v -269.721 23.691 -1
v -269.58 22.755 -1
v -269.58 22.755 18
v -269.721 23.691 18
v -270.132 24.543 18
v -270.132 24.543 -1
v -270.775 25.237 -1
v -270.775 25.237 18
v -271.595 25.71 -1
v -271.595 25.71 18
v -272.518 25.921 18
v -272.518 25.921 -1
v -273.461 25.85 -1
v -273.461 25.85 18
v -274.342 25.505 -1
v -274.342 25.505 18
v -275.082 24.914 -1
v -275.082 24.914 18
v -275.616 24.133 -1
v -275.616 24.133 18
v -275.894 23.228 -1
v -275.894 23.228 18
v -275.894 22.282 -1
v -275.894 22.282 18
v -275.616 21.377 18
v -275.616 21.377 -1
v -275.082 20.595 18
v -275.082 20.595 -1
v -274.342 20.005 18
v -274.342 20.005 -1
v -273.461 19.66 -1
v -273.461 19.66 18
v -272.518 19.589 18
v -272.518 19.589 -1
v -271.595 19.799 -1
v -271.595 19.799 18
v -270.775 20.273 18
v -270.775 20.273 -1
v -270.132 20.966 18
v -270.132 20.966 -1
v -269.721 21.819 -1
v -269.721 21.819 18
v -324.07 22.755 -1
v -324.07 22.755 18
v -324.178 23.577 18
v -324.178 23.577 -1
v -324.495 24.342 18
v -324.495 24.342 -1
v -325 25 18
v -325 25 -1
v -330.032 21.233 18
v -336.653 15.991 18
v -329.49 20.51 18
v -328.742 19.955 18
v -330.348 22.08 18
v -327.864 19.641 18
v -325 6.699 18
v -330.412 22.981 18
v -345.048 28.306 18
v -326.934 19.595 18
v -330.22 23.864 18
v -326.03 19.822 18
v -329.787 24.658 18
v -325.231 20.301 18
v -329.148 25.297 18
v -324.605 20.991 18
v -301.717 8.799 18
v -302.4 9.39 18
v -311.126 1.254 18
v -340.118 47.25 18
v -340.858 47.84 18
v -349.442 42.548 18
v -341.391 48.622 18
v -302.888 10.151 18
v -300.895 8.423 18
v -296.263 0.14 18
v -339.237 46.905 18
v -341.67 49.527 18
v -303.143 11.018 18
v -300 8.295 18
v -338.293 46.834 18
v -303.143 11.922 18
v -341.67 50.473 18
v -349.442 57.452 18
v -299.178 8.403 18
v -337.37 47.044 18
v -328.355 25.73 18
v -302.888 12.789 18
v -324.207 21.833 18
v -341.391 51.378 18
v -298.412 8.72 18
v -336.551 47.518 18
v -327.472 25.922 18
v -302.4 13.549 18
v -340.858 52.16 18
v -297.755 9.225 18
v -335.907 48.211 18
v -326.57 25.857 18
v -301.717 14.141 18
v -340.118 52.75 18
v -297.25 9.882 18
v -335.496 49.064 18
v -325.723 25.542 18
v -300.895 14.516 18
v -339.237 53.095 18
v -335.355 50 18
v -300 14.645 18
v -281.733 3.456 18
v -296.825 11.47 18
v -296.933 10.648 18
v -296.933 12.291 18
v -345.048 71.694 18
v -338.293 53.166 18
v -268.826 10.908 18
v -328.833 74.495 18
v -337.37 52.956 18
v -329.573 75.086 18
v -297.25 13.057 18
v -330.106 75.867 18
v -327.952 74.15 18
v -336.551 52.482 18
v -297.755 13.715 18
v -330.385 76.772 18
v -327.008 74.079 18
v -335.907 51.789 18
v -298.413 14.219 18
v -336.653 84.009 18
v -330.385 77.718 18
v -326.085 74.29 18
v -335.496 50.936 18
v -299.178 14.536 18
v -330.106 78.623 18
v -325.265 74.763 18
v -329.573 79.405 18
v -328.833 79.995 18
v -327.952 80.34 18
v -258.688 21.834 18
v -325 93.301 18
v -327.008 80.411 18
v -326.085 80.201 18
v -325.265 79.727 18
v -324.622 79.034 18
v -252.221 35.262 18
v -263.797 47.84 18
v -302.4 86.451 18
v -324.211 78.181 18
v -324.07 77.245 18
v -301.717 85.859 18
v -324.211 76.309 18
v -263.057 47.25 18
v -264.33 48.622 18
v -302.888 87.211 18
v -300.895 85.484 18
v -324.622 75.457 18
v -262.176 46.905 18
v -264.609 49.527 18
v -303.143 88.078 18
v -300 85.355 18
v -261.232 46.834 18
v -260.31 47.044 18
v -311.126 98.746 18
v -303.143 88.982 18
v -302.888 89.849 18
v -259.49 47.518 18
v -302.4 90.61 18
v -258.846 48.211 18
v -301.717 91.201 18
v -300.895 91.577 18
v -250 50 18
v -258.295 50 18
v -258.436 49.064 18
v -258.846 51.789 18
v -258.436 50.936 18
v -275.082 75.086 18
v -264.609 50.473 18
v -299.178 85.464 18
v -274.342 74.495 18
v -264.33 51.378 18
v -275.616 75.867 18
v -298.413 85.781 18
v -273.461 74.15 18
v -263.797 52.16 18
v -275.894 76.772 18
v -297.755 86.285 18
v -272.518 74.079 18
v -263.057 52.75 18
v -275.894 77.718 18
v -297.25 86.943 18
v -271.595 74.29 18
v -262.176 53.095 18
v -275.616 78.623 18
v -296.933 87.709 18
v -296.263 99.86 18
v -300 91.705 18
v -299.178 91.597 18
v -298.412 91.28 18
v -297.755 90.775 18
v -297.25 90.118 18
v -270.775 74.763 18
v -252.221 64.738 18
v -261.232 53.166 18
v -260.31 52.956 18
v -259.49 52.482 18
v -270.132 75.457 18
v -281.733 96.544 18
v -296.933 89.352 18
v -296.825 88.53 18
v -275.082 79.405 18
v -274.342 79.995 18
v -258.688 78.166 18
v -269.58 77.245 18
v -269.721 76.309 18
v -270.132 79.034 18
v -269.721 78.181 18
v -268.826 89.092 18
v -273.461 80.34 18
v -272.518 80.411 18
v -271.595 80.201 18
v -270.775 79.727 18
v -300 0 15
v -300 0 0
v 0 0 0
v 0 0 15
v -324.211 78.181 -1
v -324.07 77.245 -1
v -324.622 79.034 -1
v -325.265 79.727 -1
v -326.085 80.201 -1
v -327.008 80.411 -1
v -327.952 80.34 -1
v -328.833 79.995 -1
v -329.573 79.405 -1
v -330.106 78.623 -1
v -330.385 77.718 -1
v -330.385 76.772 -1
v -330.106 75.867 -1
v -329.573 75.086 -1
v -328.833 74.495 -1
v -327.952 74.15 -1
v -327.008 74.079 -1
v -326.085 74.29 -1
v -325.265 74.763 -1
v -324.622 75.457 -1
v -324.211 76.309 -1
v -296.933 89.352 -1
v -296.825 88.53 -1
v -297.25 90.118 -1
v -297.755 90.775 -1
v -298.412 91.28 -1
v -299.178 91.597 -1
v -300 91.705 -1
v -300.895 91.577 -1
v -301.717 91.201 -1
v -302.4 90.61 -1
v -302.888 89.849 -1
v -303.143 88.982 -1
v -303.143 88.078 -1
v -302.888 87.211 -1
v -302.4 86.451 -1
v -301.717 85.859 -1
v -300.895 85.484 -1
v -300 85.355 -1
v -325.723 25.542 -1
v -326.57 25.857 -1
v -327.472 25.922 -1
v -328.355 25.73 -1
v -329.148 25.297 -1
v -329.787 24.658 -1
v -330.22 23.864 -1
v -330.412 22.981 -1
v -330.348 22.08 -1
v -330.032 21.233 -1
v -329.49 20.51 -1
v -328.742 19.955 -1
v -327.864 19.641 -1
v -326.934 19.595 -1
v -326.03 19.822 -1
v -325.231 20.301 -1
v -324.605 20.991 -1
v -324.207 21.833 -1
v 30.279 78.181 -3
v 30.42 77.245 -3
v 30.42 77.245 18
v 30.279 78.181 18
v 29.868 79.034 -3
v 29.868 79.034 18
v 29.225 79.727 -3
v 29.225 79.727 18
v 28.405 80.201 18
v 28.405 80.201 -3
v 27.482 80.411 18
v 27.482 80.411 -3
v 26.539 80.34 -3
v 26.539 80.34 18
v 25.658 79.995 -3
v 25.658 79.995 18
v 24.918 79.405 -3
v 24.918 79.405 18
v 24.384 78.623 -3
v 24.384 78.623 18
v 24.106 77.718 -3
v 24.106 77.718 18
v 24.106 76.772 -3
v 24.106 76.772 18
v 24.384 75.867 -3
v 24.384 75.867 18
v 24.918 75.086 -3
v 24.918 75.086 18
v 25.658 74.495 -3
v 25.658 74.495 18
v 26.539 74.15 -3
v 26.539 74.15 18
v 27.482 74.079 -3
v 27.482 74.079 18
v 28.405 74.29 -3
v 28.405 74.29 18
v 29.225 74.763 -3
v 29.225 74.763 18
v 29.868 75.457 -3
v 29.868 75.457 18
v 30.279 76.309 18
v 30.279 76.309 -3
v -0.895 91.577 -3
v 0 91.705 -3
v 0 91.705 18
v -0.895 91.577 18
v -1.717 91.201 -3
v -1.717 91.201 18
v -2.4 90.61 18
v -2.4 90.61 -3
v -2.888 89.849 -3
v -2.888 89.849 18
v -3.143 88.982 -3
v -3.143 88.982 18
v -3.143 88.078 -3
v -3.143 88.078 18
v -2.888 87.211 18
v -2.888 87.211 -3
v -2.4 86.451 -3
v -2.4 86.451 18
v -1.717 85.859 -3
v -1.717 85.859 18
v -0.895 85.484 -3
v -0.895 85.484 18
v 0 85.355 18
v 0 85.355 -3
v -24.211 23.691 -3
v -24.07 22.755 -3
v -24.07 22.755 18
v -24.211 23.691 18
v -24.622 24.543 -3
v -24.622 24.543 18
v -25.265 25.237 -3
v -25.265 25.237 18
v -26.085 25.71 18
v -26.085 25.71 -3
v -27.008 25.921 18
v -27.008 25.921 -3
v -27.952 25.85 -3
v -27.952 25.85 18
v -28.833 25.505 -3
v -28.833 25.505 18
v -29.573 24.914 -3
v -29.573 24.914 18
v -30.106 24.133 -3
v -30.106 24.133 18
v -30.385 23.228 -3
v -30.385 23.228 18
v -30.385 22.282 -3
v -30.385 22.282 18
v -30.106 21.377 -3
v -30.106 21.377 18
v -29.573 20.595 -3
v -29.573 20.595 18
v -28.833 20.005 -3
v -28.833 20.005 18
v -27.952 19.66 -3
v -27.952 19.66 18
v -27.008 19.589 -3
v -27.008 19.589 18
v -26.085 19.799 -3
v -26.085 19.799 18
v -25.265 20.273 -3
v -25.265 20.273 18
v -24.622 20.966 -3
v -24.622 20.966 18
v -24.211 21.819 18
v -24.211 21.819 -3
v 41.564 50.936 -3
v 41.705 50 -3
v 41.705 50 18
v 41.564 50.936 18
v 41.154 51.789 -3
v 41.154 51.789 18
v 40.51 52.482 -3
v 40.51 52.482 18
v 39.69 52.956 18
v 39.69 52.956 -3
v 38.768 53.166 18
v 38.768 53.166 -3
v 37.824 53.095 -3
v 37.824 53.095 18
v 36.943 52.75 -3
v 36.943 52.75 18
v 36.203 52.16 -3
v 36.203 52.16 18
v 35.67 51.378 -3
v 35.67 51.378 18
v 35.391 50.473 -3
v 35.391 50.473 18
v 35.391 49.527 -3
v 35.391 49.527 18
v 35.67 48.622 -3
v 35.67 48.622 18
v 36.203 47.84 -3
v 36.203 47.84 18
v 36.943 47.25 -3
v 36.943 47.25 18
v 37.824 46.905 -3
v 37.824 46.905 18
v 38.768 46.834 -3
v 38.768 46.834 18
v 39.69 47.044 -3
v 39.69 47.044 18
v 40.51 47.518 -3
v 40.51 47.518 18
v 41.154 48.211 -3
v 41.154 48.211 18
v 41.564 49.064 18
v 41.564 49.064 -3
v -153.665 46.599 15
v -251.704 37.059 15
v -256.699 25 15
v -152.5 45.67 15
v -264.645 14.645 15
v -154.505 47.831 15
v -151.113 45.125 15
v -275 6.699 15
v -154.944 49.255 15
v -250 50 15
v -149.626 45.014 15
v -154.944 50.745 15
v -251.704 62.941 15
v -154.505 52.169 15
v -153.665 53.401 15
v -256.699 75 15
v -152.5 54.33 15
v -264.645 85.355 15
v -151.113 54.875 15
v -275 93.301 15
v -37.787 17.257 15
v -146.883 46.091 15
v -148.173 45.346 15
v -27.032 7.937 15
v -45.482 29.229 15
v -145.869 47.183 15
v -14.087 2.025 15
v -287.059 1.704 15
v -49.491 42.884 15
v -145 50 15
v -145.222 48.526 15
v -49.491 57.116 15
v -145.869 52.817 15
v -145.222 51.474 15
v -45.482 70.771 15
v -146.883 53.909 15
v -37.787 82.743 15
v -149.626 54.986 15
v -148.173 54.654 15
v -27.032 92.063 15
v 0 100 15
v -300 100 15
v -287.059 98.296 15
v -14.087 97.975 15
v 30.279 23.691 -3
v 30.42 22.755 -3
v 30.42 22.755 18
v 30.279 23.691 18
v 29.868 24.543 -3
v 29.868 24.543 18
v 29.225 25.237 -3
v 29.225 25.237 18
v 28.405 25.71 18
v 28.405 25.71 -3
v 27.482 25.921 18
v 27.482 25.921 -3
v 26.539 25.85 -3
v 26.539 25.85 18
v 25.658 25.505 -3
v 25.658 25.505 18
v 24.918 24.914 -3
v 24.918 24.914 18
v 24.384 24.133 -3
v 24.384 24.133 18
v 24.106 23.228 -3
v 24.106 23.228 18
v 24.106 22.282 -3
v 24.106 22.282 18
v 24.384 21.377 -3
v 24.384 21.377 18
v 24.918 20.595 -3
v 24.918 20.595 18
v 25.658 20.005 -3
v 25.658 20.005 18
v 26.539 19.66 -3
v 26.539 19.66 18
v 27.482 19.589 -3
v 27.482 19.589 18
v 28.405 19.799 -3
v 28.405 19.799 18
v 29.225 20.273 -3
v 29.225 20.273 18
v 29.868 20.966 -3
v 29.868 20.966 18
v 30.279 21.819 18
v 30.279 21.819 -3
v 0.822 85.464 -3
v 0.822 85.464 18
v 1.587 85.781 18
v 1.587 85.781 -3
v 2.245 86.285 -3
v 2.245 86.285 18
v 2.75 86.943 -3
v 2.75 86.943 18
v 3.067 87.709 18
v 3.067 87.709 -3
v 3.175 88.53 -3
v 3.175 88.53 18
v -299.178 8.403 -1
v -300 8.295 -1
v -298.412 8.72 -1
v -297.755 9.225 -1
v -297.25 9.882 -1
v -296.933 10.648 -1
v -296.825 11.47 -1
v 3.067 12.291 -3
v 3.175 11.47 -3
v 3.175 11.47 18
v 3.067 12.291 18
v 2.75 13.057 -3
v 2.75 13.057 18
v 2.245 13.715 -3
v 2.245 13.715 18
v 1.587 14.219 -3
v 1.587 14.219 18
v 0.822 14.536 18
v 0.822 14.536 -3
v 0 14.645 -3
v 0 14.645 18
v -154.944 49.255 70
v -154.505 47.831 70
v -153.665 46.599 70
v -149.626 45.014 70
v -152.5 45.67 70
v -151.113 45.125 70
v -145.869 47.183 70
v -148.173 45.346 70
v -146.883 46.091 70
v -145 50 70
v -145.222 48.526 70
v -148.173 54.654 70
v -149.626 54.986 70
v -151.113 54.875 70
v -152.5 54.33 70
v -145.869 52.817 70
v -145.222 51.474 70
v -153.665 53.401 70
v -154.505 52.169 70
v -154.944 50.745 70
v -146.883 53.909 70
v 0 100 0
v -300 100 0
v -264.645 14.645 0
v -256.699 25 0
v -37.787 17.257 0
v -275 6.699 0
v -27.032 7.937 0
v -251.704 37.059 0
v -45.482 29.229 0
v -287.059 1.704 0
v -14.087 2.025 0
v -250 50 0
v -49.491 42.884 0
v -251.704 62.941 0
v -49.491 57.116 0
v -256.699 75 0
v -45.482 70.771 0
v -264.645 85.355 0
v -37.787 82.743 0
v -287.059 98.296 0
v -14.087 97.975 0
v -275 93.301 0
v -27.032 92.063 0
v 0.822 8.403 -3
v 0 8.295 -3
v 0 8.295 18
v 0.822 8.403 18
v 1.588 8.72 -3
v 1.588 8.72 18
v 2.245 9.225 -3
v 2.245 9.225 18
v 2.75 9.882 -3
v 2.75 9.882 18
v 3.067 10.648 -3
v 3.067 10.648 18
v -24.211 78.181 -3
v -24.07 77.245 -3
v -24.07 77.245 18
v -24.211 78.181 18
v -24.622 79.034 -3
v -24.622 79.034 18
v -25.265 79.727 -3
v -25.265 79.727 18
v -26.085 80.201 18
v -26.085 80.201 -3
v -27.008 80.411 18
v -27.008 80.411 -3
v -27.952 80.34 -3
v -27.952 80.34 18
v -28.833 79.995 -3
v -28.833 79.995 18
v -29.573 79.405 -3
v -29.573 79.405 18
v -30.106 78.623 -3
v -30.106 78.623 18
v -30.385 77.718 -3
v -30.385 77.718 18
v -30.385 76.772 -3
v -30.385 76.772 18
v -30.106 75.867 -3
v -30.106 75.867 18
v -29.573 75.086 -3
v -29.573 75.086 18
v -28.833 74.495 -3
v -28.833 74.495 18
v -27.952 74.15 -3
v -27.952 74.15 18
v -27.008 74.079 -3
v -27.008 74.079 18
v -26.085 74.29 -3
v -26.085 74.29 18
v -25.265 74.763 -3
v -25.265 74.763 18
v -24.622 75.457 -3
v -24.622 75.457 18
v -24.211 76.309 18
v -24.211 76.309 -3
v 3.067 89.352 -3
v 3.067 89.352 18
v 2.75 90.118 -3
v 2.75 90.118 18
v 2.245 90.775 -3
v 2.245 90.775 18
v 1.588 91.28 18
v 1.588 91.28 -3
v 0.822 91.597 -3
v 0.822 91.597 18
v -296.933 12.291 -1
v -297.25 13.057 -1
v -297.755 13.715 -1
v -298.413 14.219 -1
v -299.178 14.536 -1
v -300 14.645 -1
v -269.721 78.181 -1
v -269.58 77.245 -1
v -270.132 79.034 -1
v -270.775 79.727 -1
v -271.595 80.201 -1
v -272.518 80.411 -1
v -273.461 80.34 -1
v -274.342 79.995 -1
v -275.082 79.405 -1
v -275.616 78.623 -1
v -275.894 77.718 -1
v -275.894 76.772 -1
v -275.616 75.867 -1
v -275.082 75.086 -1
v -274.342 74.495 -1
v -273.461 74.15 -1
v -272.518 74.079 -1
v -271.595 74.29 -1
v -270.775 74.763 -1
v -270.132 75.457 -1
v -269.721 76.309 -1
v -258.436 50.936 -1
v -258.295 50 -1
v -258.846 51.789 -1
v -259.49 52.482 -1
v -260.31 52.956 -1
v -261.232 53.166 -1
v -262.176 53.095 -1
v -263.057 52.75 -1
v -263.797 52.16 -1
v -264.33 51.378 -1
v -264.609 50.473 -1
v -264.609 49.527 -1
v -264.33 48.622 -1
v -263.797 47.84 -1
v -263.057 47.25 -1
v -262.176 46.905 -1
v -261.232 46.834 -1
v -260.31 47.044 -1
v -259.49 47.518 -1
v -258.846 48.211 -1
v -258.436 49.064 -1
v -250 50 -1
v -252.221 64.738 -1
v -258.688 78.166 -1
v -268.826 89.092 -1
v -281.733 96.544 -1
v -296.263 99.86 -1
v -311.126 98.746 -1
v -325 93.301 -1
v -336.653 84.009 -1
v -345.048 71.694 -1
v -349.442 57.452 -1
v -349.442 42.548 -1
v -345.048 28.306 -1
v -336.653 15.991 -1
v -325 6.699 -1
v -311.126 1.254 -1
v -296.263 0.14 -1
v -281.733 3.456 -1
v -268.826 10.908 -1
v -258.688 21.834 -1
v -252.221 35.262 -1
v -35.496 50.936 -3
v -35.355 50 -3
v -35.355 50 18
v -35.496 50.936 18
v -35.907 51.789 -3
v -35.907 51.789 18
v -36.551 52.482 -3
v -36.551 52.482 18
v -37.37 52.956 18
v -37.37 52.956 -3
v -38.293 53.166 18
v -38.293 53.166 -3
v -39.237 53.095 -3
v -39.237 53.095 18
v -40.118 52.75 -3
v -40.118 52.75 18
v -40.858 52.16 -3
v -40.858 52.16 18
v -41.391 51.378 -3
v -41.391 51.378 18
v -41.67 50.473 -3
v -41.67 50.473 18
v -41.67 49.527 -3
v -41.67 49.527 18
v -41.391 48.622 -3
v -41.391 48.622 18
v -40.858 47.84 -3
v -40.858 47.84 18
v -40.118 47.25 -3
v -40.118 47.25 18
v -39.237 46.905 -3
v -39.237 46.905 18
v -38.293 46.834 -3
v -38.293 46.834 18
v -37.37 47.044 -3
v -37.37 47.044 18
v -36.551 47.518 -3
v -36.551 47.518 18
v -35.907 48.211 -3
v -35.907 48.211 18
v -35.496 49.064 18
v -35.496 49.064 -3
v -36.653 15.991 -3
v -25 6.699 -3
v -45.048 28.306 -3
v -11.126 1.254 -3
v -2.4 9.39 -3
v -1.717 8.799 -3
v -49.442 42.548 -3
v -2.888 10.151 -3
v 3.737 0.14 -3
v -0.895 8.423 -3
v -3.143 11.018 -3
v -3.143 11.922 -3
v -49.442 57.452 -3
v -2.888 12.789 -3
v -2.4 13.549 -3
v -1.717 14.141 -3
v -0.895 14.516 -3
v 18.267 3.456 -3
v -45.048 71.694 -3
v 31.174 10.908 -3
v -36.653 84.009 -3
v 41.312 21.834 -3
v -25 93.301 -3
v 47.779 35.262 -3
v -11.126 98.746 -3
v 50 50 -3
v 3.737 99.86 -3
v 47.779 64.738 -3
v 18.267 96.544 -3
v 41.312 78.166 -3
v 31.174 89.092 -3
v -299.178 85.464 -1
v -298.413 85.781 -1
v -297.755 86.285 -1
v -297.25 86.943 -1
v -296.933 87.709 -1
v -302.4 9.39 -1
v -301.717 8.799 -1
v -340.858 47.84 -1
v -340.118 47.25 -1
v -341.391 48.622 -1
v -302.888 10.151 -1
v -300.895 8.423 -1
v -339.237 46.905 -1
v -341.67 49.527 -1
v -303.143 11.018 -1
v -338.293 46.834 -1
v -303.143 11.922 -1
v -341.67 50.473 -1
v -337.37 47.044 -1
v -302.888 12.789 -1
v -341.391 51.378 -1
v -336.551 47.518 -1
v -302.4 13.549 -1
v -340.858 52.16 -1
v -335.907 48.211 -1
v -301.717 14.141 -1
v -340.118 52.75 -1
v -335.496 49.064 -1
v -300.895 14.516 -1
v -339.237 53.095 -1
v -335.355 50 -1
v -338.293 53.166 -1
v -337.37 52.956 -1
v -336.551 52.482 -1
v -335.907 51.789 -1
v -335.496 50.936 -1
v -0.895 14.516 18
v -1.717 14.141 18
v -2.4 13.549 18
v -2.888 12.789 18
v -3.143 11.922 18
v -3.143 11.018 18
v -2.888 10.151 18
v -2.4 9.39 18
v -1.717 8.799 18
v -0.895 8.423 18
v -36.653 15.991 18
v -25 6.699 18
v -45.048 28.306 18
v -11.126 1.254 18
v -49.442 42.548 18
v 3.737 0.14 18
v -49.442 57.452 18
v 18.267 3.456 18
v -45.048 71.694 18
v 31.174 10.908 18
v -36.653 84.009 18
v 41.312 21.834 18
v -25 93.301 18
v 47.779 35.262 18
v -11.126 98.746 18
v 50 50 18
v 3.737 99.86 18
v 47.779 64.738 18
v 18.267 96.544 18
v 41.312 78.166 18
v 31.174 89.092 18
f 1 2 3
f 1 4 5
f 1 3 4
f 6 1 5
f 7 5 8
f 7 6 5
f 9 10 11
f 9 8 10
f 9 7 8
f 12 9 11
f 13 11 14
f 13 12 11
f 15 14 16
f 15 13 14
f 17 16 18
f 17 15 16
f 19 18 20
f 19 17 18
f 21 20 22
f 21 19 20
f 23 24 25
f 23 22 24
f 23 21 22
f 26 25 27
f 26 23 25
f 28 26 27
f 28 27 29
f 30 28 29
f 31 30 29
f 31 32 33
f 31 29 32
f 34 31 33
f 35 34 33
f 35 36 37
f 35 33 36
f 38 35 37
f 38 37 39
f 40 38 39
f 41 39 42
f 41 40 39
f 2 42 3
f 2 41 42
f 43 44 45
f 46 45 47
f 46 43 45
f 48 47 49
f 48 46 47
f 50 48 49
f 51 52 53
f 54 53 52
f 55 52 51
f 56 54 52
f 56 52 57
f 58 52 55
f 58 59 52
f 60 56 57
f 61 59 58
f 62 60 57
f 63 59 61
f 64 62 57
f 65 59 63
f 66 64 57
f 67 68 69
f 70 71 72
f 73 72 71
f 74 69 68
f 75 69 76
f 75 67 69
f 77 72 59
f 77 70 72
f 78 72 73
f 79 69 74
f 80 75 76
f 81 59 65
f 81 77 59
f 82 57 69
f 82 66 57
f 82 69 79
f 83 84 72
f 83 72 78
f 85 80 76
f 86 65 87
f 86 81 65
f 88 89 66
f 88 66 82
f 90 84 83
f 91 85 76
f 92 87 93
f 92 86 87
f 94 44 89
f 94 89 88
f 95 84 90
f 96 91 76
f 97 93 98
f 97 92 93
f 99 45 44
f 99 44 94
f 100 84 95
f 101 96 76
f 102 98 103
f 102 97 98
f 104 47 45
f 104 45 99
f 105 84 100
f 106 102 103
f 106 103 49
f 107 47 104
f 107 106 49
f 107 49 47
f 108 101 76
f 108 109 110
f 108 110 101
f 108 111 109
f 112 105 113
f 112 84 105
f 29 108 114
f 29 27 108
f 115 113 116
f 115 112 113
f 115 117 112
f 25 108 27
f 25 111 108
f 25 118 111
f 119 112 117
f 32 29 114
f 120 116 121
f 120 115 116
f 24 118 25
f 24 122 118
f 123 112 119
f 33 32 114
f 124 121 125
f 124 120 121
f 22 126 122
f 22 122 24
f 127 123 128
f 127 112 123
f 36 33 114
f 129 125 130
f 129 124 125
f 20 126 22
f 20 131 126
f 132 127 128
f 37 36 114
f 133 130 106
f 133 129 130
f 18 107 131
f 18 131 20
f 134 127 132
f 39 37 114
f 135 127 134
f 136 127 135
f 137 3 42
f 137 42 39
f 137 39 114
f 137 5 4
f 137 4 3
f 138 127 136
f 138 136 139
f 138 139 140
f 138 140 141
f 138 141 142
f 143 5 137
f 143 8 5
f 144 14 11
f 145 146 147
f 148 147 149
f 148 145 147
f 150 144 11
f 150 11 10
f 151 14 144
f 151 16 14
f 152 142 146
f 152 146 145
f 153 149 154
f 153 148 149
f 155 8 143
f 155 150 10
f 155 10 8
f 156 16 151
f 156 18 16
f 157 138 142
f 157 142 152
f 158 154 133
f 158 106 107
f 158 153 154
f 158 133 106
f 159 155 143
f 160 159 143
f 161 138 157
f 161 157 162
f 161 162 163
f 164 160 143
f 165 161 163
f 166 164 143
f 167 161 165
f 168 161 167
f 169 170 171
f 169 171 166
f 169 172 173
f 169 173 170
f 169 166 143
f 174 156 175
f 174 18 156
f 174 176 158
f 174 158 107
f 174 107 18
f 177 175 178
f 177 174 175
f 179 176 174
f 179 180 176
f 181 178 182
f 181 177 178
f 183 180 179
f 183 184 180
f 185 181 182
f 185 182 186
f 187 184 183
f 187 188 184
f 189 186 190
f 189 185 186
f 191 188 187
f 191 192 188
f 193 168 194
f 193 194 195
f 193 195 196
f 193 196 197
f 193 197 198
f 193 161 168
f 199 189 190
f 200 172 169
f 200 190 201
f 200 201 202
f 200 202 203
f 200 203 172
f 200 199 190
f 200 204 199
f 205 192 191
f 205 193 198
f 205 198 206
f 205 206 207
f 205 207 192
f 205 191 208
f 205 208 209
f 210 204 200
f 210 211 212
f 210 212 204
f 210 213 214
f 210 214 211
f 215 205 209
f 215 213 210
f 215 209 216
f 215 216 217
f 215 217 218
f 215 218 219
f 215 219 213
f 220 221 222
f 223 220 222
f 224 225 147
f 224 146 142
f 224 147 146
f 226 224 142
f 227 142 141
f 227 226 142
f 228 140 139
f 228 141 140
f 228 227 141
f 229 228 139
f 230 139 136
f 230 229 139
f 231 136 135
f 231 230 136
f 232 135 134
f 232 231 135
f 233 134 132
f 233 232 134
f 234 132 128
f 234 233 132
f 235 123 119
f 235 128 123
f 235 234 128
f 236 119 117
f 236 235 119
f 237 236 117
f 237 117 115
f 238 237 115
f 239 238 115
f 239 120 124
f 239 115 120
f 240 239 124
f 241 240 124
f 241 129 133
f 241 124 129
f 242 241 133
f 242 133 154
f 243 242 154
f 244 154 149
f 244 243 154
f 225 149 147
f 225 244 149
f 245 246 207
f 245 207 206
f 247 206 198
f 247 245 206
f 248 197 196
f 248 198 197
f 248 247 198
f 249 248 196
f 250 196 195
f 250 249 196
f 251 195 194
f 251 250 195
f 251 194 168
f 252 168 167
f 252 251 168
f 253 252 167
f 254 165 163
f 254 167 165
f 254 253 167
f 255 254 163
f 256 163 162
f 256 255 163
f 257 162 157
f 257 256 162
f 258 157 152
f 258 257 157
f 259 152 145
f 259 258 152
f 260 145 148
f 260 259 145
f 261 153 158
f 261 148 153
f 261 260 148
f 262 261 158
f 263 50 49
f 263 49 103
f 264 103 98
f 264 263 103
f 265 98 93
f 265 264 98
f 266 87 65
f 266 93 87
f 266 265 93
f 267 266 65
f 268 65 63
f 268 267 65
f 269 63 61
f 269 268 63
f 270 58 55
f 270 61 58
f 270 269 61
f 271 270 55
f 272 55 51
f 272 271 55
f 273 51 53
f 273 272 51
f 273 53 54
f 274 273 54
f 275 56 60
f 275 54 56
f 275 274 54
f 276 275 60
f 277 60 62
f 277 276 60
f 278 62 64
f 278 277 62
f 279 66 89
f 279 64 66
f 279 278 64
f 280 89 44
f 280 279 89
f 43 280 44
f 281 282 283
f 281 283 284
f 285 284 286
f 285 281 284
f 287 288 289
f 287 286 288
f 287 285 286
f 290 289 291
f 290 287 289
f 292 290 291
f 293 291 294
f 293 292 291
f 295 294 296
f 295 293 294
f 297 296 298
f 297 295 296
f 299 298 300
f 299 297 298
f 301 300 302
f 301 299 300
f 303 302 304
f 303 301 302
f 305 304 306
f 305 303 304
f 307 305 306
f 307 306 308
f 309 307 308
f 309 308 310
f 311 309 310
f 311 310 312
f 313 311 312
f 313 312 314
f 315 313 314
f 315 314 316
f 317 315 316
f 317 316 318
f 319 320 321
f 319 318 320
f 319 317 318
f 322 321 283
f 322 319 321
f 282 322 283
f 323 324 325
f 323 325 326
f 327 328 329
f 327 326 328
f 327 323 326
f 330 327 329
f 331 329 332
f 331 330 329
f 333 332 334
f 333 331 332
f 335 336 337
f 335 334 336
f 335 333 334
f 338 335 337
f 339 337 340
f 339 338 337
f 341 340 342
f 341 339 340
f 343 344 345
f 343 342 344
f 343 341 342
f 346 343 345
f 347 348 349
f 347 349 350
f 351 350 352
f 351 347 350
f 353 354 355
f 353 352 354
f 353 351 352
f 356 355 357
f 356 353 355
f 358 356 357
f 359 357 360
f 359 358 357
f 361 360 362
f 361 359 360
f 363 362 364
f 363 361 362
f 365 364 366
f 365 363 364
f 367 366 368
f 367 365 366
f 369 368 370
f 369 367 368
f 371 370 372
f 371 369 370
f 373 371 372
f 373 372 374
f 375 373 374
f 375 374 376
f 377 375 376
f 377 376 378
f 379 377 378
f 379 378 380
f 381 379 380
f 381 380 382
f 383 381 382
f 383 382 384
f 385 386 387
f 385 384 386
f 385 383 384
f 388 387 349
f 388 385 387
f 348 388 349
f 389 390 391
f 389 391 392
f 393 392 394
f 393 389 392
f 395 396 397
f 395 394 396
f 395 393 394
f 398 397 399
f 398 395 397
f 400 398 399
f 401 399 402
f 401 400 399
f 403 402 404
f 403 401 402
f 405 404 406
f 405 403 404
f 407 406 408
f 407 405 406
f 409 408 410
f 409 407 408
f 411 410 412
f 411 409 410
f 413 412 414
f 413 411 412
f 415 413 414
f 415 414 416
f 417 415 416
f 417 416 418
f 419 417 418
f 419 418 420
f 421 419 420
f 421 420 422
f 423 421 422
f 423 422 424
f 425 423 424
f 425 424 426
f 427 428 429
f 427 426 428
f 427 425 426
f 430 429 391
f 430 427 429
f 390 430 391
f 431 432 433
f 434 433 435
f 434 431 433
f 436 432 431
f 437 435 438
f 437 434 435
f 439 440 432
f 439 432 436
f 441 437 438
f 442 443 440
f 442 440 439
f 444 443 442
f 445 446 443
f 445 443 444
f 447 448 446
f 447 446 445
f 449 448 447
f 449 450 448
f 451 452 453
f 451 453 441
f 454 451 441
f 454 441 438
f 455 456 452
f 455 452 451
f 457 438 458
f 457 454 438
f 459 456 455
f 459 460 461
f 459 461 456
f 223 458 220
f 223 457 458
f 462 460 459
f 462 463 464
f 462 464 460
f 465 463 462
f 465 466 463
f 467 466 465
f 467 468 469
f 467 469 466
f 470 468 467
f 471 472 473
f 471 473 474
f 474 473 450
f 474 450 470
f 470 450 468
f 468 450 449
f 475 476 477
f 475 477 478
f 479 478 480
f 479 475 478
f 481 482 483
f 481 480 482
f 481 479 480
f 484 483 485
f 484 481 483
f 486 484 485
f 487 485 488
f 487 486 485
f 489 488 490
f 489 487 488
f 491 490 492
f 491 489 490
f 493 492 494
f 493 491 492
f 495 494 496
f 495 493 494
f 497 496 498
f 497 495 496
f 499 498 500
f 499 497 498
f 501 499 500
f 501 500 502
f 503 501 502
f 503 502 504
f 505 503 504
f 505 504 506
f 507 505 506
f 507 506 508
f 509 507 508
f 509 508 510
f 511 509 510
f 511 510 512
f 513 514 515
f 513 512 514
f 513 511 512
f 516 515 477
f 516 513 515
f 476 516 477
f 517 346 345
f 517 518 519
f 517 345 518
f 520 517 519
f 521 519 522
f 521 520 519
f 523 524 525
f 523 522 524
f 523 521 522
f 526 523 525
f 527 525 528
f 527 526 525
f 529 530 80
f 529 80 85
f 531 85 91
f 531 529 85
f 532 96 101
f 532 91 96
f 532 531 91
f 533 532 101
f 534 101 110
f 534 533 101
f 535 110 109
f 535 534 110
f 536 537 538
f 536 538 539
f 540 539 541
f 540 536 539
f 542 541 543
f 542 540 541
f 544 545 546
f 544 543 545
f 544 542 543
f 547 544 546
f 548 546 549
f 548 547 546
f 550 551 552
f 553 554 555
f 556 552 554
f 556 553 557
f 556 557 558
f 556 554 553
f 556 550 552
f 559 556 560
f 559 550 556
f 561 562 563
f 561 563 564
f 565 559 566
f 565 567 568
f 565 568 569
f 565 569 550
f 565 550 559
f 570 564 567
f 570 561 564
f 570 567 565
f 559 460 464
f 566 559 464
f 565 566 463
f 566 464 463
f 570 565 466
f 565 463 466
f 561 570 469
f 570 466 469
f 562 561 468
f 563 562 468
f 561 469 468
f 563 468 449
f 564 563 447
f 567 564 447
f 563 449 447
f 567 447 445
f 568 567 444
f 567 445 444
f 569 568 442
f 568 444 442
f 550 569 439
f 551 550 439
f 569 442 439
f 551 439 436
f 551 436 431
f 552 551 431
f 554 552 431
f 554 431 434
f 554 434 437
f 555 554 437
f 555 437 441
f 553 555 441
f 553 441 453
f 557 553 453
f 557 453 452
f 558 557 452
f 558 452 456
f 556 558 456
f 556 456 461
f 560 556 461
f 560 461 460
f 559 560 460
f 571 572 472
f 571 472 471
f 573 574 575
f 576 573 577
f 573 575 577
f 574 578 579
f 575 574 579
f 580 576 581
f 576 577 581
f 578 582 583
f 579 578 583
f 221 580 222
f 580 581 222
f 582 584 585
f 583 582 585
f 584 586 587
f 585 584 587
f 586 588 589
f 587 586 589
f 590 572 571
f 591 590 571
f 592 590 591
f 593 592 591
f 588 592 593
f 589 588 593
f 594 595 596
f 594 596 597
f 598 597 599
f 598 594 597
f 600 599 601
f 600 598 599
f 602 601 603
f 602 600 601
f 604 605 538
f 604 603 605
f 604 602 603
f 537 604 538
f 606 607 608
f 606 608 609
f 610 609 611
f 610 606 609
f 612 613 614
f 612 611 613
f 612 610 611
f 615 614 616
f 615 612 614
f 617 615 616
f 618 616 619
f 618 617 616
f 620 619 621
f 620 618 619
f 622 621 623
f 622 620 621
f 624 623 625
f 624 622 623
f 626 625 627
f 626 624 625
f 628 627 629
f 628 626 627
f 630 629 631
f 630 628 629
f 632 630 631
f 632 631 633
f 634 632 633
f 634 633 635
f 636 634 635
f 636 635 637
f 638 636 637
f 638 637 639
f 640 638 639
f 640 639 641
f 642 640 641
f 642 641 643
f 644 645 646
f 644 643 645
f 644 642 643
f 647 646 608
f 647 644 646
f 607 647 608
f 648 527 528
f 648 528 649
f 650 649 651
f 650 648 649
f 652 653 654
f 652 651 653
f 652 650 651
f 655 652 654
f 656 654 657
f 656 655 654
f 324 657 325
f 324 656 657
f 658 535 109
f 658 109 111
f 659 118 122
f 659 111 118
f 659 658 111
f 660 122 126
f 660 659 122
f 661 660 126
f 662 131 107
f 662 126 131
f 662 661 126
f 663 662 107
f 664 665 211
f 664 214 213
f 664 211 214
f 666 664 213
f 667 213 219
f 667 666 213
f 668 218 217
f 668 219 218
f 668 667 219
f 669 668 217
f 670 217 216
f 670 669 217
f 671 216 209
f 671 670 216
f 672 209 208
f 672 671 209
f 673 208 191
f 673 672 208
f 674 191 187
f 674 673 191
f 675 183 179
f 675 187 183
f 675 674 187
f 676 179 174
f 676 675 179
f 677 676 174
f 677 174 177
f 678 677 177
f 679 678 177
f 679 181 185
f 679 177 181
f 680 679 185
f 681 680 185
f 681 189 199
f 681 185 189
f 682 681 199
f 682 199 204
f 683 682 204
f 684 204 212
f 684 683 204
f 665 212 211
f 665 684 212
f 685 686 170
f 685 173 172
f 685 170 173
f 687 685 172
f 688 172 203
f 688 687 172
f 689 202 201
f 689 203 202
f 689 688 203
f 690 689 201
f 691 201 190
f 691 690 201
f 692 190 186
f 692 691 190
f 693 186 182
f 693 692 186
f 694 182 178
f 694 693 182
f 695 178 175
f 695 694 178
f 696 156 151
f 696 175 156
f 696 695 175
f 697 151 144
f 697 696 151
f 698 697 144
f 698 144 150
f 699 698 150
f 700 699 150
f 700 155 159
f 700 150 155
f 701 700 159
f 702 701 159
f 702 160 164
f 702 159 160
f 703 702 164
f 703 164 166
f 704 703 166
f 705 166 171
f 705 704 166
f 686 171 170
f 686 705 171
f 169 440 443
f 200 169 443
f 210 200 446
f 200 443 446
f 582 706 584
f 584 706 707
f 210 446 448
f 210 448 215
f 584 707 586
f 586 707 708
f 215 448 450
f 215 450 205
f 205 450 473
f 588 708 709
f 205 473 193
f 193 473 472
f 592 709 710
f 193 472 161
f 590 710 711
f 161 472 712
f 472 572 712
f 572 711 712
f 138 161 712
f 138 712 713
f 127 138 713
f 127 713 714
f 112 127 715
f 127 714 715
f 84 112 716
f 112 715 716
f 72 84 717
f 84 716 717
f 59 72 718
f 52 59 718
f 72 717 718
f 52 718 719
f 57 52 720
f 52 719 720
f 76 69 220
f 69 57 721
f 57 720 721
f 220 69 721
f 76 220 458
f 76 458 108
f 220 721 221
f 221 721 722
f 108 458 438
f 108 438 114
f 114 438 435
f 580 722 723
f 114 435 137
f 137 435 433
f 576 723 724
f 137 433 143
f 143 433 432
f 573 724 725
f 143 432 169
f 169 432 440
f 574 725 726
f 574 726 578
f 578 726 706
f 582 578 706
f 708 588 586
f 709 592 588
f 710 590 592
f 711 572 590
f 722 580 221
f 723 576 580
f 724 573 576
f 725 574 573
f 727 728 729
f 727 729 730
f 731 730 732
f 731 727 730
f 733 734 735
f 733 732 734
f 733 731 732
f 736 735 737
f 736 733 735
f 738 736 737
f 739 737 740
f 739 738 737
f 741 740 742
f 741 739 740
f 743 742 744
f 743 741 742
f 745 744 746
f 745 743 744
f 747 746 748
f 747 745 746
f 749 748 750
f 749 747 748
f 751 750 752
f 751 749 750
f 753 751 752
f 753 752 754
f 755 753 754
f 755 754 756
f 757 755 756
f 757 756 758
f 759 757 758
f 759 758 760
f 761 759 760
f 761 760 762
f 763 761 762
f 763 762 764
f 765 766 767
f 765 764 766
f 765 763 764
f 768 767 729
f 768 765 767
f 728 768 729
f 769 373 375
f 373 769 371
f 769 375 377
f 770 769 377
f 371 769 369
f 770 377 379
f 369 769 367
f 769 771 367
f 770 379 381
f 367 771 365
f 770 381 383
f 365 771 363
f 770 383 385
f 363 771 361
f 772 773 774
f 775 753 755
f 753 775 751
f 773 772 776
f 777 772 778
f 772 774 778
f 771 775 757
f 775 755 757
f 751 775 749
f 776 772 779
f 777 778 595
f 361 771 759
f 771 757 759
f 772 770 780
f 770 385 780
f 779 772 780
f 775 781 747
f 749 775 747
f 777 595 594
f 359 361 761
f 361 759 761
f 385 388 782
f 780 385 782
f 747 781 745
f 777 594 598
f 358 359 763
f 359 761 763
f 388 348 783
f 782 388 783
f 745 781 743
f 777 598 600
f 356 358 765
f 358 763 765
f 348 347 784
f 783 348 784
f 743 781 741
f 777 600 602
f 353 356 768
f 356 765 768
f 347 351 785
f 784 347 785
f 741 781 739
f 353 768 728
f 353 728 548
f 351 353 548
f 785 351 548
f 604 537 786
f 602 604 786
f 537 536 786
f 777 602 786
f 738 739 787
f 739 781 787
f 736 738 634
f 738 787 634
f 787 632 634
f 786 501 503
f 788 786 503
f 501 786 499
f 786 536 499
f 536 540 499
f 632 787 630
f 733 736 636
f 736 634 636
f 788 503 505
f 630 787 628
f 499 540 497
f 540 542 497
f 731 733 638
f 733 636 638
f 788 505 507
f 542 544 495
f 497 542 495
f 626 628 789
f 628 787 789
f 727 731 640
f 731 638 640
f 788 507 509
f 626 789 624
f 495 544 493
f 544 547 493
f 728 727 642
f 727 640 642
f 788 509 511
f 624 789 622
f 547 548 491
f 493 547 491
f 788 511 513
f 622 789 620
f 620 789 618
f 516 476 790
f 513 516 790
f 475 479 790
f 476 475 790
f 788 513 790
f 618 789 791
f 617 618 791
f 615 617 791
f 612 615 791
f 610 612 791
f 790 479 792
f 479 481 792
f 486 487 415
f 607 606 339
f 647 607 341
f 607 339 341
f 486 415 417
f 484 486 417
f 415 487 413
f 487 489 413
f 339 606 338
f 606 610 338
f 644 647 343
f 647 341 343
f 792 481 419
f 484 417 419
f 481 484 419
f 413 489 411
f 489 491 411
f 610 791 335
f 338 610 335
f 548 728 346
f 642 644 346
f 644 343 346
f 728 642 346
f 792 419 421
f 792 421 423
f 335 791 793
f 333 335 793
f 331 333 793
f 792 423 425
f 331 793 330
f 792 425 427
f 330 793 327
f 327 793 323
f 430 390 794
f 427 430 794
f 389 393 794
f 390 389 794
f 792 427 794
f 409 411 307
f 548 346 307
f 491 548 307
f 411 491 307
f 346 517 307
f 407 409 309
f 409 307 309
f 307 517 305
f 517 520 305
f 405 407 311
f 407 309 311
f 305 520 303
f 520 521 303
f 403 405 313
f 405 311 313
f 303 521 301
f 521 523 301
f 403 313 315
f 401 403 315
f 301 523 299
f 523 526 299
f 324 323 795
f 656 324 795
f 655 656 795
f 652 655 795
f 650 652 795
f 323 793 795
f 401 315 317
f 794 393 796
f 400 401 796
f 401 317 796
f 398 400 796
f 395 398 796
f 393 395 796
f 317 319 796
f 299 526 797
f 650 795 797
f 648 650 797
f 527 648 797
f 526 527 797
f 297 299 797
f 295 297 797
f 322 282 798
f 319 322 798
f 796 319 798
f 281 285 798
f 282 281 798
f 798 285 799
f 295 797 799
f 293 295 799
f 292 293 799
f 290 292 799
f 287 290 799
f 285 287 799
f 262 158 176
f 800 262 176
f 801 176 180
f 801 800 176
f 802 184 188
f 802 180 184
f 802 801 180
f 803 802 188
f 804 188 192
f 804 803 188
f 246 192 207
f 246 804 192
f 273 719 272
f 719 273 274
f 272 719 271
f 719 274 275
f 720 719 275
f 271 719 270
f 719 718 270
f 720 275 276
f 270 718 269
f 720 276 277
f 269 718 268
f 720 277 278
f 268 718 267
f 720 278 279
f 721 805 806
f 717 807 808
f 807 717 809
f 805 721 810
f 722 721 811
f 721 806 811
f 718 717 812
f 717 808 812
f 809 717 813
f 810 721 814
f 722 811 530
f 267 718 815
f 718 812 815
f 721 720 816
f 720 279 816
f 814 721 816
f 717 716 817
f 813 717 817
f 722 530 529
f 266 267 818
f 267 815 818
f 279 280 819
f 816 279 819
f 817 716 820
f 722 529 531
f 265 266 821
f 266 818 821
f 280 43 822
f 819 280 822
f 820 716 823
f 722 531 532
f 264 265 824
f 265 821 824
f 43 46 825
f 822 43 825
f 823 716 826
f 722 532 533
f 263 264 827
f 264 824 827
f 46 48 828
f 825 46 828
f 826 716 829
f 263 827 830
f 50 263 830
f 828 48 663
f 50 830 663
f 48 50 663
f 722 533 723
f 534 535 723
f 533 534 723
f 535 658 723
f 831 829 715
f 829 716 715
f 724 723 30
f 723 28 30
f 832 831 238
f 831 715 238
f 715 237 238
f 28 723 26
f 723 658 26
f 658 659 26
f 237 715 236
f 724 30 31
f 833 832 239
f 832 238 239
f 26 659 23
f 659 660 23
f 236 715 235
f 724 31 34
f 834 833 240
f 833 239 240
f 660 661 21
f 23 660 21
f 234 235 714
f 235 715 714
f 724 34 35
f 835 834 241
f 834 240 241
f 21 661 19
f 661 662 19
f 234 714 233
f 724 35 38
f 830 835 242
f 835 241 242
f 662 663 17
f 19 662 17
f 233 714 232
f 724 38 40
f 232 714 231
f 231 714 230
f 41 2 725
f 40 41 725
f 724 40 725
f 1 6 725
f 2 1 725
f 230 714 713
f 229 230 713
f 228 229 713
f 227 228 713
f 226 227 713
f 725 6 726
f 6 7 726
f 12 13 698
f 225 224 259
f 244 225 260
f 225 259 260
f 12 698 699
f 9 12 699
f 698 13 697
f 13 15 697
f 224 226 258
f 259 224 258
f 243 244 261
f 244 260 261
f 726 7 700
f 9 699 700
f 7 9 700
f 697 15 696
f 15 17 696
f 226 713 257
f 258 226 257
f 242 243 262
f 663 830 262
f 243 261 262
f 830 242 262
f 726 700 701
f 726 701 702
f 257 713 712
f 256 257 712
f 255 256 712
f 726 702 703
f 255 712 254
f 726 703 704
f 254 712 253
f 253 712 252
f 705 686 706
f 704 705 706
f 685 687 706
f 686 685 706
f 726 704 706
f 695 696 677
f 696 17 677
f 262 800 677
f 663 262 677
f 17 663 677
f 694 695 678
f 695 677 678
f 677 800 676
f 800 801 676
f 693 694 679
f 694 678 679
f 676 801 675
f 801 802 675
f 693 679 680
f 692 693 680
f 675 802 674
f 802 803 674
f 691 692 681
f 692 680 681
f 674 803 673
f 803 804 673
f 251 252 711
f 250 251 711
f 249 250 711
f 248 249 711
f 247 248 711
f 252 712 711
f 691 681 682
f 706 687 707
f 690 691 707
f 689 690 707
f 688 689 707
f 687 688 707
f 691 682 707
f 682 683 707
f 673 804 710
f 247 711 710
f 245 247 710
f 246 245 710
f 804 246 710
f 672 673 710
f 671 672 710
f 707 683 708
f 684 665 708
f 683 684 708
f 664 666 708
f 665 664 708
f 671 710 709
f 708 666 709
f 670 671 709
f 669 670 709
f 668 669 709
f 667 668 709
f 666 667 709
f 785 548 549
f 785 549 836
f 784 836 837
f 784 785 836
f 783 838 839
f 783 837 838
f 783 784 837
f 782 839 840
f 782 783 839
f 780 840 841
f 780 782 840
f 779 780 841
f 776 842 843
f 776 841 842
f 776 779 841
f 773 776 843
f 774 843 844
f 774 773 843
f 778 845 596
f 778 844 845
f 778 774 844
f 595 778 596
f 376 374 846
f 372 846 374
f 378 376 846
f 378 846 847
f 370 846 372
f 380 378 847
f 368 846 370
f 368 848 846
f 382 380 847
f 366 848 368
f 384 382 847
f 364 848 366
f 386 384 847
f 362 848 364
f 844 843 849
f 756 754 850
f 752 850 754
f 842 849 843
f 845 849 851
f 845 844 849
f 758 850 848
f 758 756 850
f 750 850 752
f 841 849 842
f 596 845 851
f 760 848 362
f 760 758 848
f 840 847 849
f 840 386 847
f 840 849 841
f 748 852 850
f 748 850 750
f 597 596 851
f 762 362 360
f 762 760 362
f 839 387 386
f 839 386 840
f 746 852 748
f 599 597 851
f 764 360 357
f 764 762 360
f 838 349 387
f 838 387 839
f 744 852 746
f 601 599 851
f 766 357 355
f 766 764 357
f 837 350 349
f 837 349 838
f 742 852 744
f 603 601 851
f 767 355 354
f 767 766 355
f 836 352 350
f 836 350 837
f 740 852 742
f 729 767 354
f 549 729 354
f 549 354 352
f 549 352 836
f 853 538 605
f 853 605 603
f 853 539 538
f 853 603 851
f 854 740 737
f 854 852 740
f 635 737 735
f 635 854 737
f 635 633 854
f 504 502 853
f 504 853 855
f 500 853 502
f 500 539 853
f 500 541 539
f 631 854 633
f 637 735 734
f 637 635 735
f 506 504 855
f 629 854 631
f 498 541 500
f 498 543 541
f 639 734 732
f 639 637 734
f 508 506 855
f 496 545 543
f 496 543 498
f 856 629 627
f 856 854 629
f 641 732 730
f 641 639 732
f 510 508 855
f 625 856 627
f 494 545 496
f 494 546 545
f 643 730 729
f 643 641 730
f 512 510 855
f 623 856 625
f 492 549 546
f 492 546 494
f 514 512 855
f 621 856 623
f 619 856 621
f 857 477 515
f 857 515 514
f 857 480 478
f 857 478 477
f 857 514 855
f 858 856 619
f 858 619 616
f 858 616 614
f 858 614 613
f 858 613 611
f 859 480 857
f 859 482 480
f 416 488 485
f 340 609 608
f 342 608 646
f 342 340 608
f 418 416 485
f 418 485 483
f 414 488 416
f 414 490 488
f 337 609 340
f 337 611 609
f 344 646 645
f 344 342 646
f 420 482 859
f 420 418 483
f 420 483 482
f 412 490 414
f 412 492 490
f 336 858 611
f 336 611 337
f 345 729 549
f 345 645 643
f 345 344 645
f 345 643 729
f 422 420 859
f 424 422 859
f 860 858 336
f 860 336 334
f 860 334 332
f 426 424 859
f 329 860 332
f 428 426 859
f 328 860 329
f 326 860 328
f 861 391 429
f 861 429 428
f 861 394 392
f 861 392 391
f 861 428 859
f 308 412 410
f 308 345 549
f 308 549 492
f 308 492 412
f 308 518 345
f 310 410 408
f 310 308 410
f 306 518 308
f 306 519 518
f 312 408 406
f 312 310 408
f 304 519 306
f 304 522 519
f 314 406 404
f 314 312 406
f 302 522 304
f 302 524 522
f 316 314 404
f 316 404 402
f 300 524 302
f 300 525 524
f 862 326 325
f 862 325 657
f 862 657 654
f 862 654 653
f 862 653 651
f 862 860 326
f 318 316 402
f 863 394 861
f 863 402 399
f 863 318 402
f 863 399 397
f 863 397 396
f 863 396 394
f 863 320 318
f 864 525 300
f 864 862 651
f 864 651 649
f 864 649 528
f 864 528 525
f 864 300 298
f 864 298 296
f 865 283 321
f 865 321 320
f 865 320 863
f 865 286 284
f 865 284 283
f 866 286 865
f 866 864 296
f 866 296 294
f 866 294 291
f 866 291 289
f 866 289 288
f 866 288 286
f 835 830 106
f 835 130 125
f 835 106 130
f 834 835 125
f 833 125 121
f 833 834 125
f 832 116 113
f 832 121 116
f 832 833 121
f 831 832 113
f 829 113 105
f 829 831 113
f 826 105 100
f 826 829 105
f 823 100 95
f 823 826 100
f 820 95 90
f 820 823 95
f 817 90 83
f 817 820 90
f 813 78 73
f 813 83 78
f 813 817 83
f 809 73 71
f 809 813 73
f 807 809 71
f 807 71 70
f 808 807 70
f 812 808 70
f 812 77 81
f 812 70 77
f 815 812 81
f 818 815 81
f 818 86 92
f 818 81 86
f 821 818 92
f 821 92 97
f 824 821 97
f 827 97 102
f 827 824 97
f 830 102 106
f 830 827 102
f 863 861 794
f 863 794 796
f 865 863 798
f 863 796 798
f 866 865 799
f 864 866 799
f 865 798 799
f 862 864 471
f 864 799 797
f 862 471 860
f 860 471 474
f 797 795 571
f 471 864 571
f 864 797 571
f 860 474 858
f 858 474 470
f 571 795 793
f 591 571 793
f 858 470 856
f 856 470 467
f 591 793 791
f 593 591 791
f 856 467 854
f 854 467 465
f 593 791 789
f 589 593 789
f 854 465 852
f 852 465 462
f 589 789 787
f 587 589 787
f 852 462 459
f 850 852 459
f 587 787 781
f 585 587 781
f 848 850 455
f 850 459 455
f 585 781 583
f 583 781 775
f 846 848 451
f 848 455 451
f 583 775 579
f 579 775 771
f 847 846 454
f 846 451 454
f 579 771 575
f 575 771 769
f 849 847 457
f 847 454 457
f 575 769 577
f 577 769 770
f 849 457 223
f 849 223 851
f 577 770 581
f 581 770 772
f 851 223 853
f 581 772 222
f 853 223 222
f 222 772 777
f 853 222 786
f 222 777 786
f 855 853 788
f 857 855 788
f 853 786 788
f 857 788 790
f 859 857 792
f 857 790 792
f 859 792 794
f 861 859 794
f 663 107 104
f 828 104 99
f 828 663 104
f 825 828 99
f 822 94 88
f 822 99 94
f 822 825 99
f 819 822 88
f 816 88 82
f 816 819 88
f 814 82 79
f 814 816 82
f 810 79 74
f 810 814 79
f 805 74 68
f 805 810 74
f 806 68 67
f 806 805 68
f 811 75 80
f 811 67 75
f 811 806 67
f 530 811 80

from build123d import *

# Parameters (mm, degrees)
SKETCH_1_R               = 50
EXTRUDE_18_DEPTH         = 13
EXTRUDE_18_2_DEPTH       = 13
SKETCH_1_28_W            = 300
SKETCH_1_28_H            = 100
EXTRUDE_21_DEPTH         = 15
SKETCH_1_30_R            = 5
EXTRUDE_22_DEPTH         = 70
SKETCH_1_31_R            = 50
CUT_EXTRUDE_2_DEPTH      = 41
EXTRUDE_23_DEPTH         = 18
EXTRUDE_23_DEPTH_BACK    = 1
SKETCH_1_32_R            = 50
SKETCH_1_33_R            = 6.5
CUT_EXTRUDE_3_DEPTH      = 242.8
CUT_EXTRUDE_5_DEPTH      = 130
CUT_EXTRUDE_5_DEPTH_BACK = 69
SKETCH_1_35_R            = 3.175
SKETCH_1_36_R            = 50
CUT_EXTRUDE_6_DEPTH      = 34
EXTRUDE_24_DEPTH         = 18
EXTRUDE_24_DEPTH_BACK    = 3
SKETCH_1_37_R            = 50
CUT_EXTRUDE_7_DEPTH      = 87
CUT_EXTRUDE_7_DEPTH_BACK = 98
SKETCH_1_41_R            = 3.175


with BuildPart() as part:
    # 草图1 → 凸台-拉伸18 (new body)
    with BuildSketch(Plane.XY):
        with Locations((0, 50)):
            Circle(SKETCH_1_R)
    extrude(amount=EXTRUDE_18_DEPTH)



with BuildPart() as body_2:
    # 草图1 → Extrude 18 2 (new body)
    with BuildSketch(Plane.XY):
        with Locations((-300, 50)):
            Circle(SKETCH_1_R)
    extrude(amount=EXTRUDE_18_2_DEPTH)


with BuildPart() as part_1:
    add(part.part)

    add(body_2.part)  # 凸台-拉伸21 merges body 2
    # 草图1<28> → 凸台-拉伸21 (add)
    with BuildSketch(Plane.XY):
        with Locations((-150, 50)):
            Rectangle(SKETCH_1_28_W, SKETCH_1_28_H)
    extrude(amount=EXTRUDE_21_DEPTH)

    # 草图1<30> → 凸台-拉伸22 (add)
    with BuildSketch(Plane.XY):
        with Locations((-150, 50)):
            Circle(SKETCH_1_30_R)
    extrude(amount=EXTRUDE_22_DEPTH)

    # 草图1<31> → 切除-拉伸2 (cut)
    with BuildSketch(Plane.XY):
        with Locations((-300, 50)):
            Circle(SKETCH_1_31_R)
    extrude(amount=CUT_EXTRUDE_2_DEPTH, mode=Mode.SUBTRACT)

    # 草图1<32> → 凸台-拉伸23 (add, two sides: drawn at the far end of the back side and taken through both)
    with BuildSketch(Plane.XY.offset(-EXTRUDE_23_DEPTH_BACK)):
        with Locations((-300, 50)):
            Circle(SKETCH_1_32_R)
    extrude(amount=EXTRUDE_23_DEPTH + EXTRUDE_23_DEPTH_BACK)

    # 草图1<33> → 切除-拉伸3 (cut)
    with BuildSketch(Plane.XY):
        with Locations((0, 50)):
            Circle(SKETCH_1_33_R)
    extrude(amount=CUT_EXTRUDE_3_DEPTH, mode=Mode.SUBTRACT)

    # 草图1<35> → 切除-拉伸5 (cut, two sides: drawn at the far end of the back side and taken through both)
    with BuildSketch(Plane.XY.offset(-CUT_EXTRUDE_5_DEPTH_BACK)):
        with Locations((-261.469660941, 50)):
            Circle(SKETCH_1_35_R)
    extrude(amount=CUT_EXTRUDE_5_DEPTH + CUT_EXTRUDE_5_DEPTH_BACK, mode=Mode.SUBTRACT)

    # 草图1<36> → 切除-拉伸6 (cut)
    with BuildSketch(Plane.XY):
        with Locations((0, 50)):
            Circle(SKETCH_1_36_R)
    extrude(amount=CUT_EXTRUDE_6_DEPTH, mode=Mode.SUBTRACT)

    # 草图1<37> → 凸台-拉伸24 (add, two sides: drawn at the far end of the back side and taken through both)
    with BuildSketch(Plane.XY.offset(-EXTRUDE_24_DEPTH_BACK)):
        with Locations((0, 50)):
            Circle(SKETCH_1_37_R)
    extrude(amount=EXTRUDE_24_DEPTH + EXTRUDE_24_DEPTH_BACK)

    # 草图1<41> → 切除-拉伸7 (cut, two sides: drawn at the far end of the back side and taken through both)
    with BuildSketch(Plane.XY.offset(-CUT_EXTRUDE_7_DEPTH_BACK)):
        with Locations((0, 11.469660941)):
            Circle(SKETCH_1_41_R)
        with Locations((0, 88.530339059)):
            Circle(SKETCH_1_41_R)
        with Locations((-300, 11.469660941)):
            Circle(SKETCH_1_41_R)
        with Locations((-300, 88.530339059)):
            Circle(SKETCH_1_41_R)
        with Locations((-327.24506403, 22.75493597)):
            Circle(SKETCH_1_41_R)
        with Locations((-261.469660941, 50)):
            Circle(SKETCH_1_41_R)
        with Locations((-38.530339059, 50)):
            Circle(SKETCH_1_41_R)
        with Locations((-272.75493597, 22.75493597)):
            Circle(SKETCH_1_41_R)
        with Locations((-338.530339059, 50)):
            Circle(SKETCH_1_41_R)
        with Locations((-327.24506403, 77.24506403)):
            Circle(SKETCH_1_41_R)
        with Locations((-272.75493597, 77.24506403)):
            Circle(SKETCH_1_41_R)
        with Locations((-27.24506403, 77.24506403)):
            Circle(SKETCH_1_41_R)
        with Locations((27.24506403, 77.24506403)):
            Circle(SKETCH_1_41_R)
        with Locations((38.530339059, 50)):
            Circle(SKETCH_1_41_R)
        with Locations((27.24506403, 22.75493597)):
            Circle(SKETCH_1_41_R)
        with Locations((-27.24506403, 22.75493597)):
            Circle(SKETCH_1_41_R)
    extrude(amount=CUT_EXTRUDE_7_DEPTH + CUT_EXTRUDE_7_DEPTH_BACK, mode=Mode.SUBTRACT)


solid = part_1.part
